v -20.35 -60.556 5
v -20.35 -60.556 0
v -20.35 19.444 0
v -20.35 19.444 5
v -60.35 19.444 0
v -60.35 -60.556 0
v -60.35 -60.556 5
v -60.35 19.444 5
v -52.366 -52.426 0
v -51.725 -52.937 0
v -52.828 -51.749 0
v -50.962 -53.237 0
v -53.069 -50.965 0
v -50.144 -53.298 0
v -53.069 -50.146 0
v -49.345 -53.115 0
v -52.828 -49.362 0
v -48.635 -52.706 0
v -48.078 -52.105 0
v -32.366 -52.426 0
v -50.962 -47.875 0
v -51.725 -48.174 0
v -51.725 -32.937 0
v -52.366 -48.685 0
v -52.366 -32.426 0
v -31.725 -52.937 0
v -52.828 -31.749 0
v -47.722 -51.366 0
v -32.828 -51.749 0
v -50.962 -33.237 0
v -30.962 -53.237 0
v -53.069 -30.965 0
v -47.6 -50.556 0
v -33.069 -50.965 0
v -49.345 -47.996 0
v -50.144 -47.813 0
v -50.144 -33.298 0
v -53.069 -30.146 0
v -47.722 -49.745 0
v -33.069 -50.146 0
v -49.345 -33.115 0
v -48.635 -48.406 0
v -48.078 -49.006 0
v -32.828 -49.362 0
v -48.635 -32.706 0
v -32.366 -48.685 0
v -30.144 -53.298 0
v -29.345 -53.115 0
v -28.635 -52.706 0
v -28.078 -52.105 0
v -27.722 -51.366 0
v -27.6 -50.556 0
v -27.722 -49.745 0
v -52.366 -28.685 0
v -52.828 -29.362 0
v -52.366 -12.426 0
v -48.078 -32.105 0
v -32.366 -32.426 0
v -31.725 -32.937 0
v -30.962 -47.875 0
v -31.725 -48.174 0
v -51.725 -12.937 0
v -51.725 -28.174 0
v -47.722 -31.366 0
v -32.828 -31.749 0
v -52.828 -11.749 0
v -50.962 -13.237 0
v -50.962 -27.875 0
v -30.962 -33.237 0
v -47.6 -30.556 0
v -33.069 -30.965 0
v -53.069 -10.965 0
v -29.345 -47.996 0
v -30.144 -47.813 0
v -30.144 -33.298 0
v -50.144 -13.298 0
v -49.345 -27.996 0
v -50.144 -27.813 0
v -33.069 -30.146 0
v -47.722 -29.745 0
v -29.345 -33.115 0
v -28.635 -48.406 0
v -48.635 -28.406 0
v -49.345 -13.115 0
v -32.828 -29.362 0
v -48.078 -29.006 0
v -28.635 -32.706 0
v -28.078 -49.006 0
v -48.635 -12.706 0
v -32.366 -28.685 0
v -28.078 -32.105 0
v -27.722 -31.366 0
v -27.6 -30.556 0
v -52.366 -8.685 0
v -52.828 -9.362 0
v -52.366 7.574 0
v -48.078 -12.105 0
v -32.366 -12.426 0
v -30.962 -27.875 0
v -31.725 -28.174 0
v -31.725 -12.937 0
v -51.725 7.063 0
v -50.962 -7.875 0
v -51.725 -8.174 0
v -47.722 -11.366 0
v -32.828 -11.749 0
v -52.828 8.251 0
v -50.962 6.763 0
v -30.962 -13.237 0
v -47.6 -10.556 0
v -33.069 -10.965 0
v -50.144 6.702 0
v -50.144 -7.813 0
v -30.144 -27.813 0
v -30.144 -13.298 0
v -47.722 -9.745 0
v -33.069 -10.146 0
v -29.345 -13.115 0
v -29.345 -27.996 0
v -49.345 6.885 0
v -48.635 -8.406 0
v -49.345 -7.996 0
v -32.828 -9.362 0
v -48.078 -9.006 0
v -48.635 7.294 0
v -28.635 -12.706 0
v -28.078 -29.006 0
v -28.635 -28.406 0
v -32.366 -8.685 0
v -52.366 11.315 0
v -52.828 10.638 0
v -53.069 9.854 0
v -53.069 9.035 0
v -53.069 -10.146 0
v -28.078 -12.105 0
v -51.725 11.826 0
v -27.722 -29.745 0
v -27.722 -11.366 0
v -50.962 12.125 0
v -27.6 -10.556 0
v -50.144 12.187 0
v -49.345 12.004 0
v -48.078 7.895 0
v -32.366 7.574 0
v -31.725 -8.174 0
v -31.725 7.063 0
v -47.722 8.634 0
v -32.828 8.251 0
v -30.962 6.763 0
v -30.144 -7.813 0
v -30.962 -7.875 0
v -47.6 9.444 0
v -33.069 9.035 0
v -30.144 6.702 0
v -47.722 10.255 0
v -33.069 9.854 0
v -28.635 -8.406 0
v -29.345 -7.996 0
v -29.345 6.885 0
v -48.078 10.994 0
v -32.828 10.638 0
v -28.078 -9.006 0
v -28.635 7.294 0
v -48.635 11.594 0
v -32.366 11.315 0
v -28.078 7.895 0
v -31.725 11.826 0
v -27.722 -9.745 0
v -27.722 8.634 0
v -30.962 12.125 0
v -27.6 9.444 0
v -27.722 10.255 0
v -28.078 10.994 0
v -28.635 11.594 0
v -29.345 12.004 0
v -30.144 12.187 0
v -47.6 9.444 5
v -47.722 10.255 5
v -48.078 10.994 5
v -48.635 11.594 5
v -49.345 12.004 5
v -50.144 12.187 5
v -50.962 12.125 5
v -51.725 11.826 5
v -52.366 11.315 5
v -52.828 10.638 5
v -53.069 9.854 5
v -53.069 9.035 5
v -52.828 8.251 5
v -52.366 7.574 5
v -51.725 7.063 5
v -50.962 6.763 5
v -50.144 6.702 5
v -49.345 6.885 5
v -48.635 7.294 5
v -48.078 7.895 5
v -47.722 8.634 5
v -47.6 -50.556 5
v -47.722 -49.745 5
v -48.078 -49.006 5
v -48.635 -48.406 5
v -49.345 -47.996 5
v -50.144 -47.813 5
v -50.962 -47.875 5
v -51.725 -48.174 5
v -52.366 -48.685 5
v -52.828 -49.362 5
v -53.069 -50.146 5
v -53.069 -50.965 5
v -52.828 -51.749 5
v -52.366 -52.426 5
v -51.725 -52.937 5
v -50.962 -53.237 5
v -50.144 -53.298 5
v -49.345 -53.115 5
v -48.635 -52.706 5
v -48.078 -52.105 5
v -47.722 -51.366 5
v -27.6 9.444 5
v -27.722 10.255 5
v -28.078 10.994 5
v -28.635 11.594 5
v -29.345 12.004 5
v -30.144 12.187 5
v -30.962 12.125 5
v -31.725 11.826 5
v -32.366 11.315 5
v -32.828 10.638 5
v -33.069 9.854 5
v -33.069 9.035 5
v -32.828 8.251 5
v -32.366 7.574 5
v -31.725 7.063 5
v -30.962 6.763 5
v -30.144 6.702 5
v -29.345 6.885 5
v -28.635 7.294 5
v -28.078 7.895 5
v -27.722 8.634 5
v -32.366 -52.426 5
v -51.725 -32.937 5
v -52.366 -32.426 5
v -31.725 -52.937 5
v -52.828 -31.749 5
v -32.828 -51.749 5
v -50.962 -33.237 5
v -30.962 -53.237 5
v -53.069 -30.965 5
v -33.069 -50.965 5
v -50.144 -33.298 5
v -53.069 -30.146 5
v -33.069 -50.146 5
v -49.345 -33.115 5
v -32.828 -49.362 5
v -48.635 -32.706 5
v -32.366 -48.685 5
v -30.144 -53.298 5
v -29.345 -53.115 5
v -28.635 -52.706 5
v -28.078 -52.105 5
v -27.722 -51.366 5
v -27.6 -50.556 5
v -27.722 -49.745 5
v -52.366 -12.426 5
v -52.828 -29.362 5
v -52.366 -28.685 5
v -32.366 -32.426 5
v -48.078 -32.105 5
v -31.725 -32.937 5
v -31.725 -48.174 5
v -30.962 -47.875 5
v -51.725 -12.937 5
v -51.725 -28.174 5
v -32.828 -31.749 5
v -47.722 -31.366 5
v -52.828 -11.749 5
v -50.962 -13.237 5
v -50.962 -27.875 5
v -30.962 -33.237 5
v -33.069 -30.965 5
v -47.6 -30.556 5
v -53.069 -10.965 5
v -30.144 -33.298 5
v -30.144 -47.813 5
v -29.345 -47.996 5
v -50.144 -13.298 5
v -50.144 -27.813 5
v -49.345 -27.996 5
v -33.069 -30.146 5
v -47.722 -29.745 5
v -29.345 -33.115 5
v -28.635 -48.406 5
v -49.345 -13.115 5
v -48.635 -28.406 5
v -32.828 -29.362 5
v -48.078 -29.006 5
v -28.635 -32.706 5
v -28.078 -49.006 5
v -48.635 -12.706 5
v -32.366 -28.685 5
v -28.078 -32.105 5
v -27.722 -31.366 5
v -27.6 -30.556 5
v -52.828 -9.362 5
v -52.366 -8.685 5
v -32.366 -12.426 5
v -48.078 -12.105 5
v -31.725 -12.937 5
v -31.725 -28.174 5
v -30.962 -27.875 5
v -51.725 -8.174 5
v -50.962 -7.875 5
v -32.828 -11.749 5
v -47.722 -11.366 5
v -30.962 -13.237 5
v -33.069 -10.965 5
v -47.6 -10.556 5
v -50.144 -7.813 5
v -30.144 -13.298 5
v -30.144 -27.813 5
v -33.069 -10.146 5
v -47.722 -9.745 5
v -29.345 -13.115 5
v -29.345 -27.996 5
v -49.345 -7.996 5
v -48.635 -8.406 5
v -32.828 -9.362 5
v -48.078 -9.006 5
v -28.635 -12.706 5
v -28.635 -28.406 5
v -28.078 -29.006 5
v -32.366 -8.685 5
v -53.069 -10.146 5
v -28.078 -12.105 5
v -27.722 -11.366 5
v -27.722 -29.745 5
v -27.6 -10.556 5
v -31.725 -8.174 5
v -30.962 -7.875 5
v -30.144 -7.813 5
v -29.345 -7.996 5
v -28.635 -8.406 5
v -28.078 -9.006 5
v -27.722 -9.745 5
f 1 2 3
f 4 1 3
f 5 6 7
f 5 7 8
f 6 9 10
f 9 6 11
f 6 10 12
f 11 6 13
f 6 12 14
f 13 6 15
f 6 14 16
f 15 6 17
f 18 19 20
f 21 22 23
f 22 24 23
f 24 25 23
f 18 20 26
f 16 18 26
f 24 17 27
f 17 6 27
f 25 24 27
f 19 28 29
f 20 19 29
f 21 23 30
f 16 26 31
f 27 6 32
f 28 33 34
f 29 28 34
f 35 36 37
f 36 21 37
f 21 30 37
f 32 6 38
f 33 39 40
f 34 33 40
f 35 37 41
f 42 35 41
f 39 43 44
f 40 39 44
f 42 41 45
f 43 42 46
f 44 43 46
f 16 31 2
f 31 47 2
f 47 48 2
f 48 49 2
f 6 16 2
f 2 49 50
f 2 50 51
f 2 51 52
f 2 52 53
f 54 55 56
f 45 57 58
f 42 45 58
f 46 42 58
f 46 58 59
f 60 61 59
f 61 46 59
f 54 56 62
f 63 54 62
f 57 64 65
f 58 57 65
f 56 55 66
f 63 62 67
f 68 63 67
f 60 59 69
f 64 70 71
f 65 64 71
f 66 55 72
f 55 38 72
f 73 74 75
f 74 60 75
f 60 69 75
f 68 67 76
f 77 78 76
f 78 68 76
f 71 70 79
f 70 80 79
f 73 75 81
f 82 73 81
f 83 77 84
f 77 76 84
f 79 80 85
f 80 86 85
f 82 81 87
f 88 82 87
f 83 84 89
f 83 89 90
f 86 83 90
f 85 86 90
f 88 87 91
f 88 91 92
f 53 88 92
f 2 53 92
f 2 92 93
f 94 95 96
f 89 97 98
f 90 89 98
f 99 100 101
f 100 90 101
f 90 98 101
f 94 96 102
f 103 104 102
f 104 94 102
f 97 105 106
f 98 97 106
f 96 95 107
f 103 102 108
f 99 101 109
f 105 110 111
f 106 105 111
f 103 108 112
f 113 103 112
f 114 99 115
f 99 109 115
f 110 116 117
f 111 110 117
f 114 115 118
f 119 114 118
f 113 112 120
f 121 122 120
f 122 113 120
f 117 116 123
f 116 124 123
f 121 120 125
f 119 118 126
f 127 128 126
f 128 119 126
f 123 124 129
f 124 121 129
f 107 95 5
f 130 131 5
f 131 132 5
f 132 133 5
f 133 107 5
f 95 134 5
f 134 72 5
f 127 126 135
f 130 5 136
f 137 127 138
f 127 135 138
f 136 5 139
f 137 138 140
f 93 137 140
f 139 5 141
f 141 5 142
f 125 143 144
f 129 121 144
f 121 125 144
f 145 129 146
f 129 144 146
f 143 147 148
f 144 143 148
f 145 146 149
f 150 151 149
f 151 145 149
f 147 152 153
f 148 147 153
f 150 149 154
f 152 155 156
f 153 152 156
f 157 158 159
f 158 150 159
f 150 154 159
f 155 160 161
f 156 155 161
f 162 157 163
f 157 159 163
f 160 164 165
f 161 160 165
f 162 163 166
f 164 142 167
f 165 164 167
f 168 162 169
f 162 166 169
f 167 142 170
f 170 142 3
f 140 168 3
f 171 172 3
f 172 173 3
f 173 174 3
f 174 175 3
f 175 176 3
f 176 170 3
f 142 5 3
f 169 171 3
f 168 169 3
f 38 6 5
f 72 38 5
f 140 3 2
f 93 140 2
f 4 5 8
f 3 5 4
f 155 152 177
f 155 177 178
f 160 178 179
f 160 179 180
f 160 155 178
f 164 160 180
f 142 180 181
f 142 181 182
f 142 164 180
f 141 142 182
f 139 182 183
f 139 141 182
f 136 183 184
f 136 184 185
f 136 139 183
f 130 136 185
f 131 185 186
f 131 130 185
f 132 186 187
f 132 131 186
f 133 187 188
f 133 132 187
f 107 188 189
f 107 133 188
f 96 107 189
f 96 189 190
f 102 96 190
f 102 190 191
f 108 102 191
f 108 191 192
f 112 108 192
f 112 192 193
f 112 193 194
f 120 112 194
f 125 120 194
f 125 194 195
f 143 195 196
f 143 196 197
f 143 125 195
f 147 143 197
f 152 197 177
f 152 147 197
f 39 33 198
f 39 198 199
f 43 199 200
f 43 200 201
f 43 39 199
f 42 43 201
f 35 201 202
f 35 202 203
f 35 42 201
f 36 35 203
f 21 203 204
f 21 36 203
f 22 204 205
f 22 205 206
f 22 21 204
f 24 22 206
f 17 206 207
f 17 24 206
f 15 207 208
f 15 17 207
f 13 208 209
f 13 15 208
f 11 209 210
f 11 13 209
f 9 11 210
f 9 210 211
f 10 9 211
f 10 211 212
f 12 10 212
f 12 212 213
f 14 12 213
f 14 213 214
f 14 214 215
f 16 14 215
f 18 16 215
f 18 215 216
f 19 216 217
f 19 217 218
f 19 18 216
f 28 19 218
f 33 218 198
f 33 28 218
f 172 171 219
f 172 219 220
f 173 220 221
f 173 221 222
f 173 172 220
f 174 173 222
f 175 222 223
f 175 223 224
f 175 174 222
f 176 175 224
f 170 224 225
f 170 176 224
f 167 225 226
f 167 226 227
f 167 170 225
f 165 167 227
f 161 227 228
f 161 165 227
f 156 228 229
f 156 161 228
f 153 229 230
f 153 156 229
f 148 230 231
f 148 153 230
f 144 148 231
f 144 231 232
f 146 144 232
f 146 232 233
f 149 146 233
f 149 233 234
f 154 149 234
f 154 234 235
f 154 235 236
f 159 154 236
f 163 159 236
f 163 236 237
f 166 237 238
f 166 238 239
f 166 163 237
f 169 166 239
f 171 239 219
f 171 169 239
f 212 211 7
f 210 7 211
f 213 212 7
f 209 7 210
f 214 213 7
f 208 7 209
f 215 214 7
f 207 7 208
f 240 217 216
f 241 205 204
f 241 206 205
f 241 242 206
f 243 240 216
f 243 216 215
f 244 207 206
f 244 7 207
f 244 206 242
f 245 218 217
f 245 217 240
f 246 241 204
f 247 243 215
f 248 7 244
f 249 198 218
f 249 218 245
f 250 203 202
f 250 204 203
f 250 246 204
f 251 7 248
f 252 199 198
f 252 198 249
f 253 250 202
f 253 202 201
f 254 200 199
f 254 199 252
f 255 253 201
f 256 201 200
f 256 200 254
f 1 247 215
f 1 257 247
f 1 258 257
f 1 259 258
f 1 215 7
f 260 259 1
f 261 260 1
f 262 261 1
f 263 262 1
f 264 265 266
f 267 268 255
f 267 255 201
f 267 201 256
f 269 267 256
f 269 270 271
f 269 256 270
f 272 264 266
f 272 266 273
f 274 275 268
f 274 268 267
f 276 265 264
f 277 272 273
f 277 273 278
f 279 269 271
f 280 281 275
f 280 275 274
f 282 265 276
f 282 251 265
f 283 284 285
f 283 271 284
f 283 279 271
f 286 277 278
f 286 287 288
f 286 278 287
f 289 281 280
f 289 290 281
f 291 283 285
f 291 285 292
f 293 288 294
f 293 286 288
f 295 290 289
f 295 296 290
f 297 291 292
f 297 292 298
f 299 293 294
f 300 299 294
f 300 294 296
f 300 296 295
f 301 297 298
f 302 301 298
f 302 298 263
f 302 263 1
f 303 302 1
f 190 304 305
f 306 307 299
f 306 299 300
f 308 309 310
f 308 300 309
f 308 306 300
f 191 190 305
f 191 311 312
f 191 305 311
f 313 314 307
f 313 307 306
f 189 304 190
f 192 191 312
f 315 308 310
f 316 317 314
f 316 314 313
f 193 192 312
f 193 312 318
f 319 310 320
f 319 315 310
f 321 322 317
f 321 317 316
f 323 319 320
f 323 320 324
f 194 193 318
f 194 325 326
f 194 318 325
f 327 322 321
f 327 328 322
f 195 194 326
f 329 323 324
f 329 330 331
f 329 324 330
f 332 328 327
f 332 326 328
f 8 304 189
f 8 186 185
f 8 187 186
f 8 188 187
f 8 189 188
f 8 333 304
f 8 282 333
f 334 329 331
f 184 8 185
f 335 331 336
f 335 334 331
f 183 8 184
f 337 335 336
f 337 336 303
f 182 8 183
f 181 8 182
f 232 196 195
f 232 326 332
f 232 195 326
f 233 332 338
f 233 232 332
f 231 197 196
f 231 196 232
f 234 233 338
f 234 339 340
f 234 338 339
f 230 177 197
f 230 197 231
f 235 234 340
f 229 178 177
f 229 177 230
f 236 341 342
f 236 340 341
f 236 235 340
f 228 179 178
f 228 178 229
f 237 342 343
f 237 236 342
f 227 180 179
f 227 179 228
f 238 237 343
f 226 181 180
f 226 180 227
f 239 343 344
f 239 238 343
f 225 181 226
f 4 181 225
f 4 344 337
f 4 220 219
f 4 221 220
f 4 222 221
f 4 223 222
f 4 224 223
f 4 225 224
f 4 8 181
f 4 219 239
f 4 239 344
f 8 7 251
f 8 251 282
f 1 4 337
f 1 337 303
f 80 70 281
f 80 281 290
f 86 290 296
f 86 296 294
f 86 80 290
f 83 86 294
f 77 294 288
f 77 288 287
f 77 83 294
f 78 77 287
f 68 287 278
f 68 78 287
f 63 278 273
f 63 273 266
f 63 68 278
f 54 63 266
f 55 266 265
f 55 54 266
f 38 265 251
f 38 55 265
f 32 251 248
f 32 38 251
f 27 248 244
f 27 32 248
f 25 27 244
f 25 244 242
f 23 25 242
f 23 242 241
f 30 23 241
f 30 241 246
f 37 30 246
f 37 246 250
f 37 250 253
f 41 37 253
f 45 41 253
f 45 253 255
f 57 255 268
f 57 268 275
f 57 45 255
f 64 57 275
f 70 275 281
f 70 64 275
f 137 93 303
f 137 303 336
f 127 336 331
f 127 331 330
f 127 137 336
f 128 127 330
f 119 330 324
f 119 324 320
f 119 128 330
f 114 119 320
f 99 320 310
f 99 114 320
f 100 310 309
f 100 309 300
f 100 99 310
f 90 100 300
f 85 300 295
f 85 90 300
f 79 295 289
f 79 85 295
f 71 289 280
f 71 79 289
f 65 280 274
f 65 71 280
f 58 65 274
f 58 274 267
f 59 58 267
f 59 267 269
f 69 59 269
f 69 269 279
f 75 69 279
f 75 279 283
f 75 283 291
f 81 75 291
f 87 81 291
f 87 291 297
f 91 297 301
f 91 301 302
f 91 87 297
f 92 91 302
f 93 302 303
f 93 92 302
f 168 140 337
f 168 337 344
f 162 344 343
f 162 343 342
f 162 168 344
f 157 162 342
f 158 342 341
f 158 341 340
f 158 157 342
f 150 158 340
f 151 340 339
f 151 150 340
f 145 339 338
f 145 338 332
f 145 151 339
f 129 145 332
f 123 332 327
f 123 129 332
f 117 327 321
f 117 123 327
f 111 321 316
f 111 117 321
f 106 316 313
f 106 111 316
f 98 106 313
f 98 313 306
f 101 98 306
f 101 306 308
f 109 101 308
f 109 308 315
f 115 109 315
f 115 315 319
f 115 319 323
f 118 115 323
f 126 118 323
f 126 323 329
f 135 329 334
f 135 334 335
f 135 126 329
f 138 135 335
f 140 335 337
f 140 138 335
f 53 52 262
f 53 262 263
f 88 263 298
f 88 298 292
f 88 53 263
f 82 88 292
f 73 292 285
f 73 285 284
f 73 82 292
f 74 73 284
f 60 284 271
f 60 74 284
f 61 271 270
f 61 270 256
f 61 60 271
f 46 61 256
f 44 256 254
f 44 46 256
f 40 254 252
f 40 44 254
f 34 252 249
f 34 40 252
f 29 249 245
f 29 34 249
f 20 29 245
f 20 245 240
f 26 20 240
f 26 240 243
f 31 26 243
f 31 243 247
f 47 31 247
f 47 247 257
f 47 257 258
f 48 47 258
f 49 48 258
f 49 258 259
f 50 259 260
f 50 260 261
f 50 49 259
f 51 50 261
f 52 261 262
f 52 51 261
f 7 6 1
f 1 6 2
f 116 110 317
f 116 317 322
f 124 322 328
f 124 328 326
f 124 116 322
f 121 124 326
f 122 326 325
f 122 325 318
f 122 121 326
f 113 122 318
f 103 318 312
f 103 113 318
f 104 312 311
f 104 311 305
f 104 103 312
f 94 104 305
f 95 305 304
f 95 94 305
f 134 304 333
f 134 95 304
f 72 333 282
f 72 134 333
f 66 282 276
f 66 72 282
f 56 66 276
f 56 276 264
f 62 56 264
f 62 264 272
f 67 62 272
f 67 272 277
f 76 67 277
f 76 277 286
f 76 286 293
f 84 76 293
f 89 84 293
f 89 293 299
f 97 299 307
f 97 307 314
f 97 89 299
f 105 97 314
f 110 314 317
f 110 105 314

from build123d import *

# Parameters (mm, degrees)
ESQUISSE1_W        = 40
ESQUISSE1_H        = 80
ESQUISSE1_R        = 2.75
BOSS_EXTRU_1_DEPTH = 5


with BuildPart() as part:
    # Esquisse1 → Boss.-Extru.1 (new body)
    with BuildSketch(Plane.XY):
        with Locations((-40.349893162, -20.555555556)):
            Rectangle(ESQUISSE1_W, ESQUISSE1_H)
        with Locations((-50.349893162, 9.444444444)):
            Circle(ESQUISSE1_R, mode=Mode.SUBTRACT)
        with Locations((-30.349893162, 9.444444444)):
            Circle(ESQUISSE1_R, mode=Mode.SUBTRACT)
        with Locations((-30.349893162, -10.555555556)):
            Circle(ESQUISSE1_R, mode=Mode.SUBTRACT)
        with Locations((-30.349893162, -30.555555556)):
            Circle(ESQUISSE1_R, mode=Mode.SUBTRACT)
        with Locations((-30.349893162, -50.555555556)):
            Circle(ESQUISSE1_R, mode=Mode.SUBTRACT)
        with Locations((-50.349893162, -10.555555556)):
            Circle(ESQUISSE1_R, mode=Mode.SUBTRACT)
        with Locations((-50.349893162, -30.555555556)):
            Circle(ESQUISSE1_R, mode=Mode.SUBTRACT)
        with Locations((-50.349893162, -50.555555556)):
            Circle(ESQUISSE1_R, mode=Mode.SUBTRACT)
    extrude(amount=BOSS_EXTRU_1_DEPTH)


solid = part.part
